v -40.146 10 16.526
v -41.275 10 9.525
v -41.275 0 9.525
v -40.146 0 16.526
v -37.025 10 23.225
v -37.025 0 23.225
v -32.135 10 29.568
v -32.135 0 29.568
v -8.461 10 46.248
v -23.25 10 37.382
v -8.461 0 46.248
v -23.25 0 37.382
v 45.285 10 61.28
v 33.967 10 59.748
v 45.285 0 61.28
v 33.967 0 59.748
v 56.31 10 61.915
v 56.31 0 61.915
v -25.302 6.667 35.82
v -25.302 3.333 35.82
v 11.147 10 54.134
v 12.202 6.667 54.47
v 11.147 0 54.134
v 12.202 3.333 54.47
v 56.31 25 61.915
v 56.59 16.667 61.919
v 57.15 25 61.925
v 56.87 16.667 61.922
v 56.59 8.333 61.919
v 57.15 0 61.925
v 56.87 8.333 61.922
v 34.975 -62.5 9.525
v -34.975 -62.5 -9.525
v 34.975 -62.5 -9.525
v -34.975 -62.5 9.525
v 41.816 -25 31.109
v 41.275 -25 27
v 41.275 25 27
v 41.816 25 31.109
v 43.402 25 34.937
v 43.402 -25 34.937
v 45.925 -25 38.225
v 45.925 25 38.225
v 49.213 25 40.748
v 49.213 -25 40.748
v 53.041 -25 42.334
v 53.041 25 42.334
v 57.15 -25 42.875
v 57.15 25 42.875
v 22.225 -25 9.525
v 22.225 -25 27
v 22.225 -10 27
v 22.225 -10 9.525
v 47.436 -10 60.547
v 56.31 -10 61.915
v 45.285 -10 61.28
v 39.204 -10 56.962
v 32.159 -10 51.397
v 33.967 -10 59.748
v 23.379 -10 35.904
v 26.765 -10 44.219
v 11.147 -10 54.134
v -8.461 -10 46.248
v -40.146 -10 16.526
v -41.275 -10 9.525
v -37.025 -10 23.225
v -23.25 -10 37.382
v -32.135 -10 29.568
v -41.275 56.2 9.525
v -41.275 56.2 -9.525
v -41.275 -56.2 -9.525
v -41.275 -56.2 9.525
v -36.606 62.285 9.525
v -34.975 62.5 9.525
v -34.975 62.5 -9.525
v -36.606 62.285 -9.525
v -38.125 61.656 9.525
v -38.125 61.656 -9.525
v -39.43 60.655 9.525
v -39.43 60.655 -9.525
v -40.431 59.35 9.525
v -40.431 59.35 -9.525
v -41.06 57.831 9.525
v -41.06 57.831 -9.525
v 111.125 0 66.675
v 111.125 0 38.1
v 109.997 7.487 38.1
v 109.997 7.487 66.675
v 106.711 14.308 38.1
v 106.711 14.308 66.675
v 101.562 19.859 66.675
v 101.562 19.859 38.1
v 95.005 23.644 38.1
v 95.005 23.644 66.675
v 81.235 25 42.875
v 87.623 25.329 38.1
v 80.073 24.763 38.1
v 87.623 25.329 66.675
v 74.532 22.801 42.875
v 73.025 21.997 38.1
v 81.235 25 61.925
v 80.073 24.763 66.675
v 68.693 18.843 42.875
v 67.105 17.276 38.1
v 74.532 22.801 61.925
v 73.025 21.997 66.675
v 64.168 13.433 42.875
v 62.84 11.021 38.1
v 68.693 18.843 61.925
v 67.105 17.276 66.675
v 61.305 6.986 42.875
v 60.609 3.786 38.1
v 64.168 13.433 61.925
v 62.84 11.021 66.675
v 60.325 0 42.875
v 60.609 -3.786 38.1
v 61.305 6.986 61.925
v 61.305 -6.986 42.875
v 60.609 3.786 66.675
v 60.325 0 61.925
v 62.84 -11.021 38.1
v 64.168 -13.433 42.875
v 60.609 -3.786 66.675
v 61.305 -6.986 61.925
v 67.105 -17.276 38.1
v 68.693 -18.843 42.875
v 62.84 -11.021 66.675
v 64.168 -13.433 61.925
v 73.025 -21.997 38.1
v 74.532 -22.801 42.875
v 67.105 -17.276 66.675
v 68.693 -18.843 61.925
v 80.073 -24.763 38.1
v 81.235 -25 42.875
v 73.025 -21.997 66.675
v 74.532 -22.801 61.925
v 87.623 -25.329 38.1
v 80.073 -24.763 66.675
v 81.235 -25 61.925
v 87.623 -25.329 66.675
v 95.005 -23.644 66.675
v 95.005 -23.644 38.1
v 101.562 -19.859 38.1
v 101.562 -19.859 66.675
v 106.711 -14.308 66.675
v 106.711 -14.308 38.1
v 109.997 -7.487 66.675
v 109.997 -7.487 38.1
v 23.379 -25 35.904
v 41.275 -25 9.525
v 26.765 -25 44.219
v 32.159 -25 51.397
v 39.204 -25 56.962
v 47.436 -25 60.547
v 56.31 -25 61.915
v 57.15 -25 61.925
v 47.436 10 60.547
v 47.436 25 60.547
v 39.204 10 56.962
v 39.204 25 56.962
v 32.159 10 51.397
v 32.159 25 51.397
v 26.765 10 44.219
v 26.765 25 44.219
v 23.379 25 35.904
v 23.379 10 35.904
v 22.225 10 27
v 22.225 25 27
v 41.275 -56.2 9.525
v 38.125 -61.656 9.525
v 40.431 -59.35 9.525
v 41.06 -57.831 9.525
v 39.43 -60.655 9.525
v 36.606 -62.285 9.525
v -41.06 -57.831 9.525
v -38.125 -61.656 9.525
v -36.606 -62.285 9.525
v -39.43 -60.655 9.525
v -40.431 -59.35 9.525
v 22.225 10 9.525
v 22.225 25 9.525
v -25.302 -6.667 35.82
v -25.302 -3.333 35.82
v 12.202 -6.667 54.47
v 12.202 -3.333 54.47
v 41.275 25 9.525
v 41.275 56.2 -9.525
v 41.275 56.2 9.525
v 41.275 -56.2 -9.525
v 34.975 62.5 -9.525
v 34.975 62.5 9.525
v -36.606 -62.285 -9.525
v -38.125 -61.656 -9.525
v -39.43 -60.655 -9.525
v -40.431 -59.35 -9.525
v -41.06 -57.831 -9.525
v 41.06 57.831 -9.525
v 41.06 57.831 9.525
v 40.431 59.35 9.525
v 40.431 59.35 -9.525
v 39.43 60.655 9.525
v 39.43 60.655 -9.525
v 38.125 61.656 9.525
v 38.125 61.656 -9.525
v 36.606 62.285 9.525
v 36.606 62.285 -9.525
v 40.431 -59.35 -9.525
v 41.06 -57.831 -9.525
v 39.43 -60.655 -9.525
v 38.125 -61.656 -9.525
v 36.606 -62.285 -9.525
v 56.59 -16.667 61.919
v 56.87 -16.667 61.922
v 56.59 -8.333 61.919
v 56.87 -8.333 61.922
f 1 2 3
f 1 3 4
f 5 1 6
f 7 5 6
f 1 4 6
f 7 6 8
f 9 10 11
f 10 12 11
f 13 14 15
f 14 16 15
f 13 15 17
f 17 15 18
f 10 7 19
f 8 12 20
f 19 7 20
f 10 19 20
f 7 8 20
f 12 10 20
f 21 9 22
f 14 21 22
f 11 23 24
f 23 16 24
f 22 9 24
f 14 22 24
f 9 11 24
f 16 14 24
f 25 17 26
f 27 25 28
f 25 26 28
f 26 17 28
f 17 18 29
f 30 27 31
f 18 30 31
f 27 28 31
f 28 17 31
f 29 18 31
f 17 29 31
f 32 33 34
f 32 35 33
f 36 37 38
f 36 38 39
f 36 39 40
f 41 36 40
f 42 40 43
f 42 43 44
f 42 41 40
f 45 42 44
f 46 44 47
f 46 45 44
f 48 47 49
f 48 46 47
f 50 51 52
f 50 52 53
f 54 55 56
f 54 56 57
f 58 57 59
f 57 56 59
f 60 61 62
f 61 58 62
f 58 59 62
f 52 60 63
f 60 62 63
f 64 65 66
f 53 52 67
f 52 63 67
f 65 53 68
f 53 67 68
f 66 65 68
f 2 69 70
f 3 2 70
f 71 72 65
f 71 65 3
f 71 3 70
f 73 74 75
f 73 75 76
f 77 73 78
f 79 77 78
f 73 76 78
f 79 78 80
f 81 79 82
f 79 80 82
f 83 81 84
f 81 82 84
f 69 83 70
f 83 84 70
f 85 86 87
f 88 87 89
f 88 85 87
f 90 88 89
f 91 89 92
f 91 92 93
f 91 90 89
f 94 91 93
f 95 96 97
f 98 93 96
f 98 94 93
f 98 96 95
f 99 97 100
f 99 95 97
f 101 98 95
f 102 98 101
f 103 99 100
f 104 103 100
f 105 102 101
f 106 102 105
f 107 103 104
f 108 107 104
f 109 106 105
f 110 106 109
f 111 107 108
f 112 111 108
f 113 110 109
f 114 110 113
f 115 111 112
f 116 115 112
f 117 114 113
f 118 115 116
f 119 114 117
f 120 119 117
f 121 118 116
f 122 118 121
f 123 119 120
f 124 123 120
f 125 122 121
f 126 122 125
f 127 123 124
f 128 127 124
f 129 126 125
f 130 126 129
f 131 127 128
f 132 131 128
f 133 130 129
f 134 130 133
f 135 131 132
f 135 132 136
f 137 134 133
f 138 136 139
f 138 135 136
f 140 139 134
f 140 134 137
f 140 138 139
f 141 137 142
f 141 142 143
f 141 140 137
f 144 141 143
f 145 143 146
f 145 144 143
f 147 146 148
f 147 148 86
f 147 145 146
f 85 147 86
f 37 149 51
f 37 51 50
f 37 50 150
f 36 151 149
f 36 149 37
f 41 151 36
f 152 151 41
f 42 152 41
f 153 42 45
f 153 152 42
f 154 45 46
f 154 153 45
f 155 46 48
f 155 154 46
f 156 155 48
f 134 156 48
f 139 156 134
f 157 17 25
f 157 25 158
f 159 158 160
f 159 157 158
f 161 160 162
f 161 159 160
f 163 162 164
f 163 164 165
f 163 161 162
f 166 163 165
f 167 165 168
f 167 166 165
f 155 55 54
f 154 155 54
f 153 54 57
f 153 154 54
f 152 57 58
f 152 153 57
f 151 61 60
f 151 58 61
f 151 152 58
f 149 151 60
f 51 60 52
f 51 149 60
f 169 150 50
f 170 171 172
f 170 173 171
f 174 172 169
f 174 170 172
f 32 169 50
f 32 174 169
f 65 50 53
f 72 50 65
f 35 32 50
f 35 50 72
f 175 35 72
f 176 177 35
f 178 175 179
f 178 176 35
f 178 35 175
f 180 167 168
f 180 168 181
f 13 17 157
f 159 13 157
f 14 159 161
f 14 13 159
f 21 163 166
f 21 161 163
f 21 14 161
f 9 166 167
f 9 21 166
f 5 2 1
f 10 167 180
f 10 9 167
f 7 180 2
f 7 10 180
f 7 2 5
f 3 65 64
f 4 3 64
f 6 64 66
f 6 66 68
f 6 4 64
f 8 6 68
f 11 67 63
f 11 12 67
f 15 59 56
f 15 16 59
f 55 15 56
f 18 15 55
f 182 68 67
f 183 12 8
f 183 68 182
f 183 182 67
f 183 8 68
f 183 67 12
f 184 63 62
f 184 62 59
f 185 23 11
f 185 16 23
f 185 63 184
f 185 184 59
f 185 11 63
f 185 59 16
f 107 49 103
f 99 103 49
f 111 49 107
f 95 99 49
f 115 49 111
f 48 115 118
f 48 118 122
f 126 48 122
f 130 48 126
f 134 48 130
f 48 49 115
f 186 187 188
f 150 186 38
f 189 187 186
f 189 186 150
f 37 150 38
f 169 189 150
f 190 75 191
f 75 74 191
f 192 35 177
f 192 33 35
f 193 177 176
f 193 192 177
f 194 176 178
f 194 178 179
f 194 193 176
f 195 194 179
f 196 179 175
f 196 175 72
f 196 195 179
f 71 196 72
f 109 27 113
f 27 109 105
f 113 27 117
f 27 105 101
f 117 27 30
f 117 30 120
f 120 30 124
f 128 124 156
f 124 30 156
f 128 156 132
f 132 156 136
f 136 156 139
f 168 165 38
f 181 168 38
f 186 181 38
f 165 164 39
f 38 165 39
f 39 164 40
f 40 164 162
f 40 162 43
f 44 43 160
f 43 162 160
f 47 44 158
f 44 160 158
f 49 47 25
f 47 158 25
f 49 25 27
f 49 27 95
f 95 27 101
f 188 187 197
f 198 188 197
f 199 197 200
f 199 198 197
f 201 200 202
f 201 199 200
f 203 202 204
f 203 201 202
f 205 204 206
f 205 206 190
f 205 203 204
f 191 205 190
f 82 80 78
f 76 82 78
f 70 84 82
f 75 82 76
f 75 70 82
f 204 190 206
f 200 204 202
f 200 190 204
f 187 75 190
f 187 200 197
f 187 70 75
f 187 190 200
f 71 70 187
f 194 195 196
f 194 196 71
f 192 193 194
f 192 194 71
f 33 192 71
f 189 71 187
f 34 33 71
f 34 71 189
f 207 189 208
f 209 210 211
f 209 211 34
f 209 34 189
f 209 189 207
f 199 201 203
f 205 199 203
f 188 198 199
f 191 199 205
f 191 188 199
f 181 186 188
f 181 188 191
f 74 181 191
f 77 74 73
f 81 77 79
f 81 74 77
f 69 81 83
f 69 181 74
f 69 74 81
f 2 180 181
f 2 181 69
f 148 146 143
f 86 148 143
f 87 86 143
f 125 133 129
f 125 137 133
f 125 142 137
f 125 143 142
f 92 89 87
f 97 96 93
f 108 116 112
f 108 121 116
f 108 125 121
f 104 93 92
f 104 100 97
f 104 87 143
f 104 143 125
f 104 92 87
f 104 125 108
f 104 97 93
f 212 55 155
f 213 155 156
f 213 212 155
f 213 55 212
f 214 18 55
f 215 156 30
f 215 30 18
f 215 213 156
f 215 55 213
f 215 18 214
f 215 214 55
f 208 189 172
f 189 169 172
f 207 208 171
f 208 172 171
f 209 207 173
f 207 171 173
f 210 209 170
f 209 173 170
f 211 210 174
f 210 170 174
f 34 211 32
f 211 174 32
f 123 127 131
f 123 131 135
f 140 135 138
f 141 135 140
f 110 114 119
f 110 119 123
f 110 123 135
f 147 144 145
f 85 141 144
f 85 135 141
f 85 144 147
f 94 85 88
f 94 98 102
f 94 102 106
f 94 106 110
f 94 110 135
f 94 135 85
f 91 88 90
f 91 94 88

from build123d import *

# Parameters (mm, degrees)
F1_DEPTH = 62.5
F2_DEPTH = 25
F3_DEPTH = 10
F0_W     = 25.4
F0_H     = 19.05
F4_DEPTH = 25
F6_R     = 6.3


with BuildPart() as f1:
    # F0 (on Front) → F1 (new body, symmetric)
    with BuildSketch(Plane.XZ):
        Polygon((22.225, 9.525), (-41.275, 9.525), (-41.275, -9.525), (41.275, -9.525), (41.275, 9.525), align=None)
    extrude(amount=F1_DEPTH, both=True)

    # F0 (on Front) → F2 (join, symmetric)
    with BuildSketch(Plane.XZ):
        with BuildLine():
            Line((22.225, 27), (22.225, 9.525))
            Line((22.225, 9.525), (41.275, 9.525))
            Line((41.275, 9.525), (41.275, 27))
            ThreePointArc((41.275, 27), (45.9246798487, 38.2253201513), (57.15, 42.875))
            Line((57.15, 42.875), (60.325, 42.875))
            Line((60.325, 42.875), (60.325, 61.925))
            Line((60.325, 61.925), (57.15, 61.925))
            add(Edge.make_bspline(
                [(56.3095148164, 61.9148852161), (56.5902291642, 61.9192274348), (56.8703973727, 61.9226005748), (57.15, 61.925)],
                knots=[110.7716747291, 110.7716747291, 110.7716747291, 110.7716747291, 111.5044421761, 111.5044421761, 111.5044421761, 111.5044421761], degree=3))
            ThreePointArc((56.3095148164, 61.9148852161), (32.1589058859, 51.3967383062), (22.225, 27))
        make_face()
    extrude(amount=F2_DEPTH, both=True)

    # F0 (on Front) → F3 (join, symmetric)
    with BuildSketch(Plane.XZ):
        with BuildLine():
            add(Edge.make_bspline(
                [(-41.275, 9.525), (-41.0414624957, 38.4566380676), (13.8742257665, 61.2584766517), (56.3095148164, 61.9148852161)],
                knots=[0, 0, 0, 0, 110.7716747291, 110.7716747291, 110.7716747291, 110.7716747291], degree=3))
            Line((-41.275, 9.525), (22.225, 9.525))
            Line((22.225, 9.525), (22.225, 27))
            ThreePointArc((22.225, 27), (32.1589058859, 51.3967383062), (56.3095148164, 61.9148852161))
        make_face()
    extrude(amount=F3_DEPTH, both=True)

    # F0 (on Front) → F4 (join, symmetric)
    with BuildSketch(Plane.XZ):
        with Locations((73.025, 52.4)):
            Rectangle(F0_W, F0_H)
    extrude(amount=F4_DEPTH, both=True)

    # F0 (on Front) → F5 (revolve)
    with BuildSketch(Plane.XZ):
        Polygon((85.725, 66.675), (85.725, 61.925), (85.725, 42.875), (85.725, 38.1), (111.125, 38.1), (111.125, 66.675), align=None)
    revolve(axis=Axis((85.725, 0, 52.3875), (0, 0, 1)))

    # F6
    f6_edges = [f1.edges().sort_by_distance(p)[0] for p in [
        (41.275, -62.5, 0),
        (-41.275, -62.5, 0),
        (41.275, 62.5, 0),
        (-41.275, 62.5, 0),
    ]]
    fillet(f6_edges, radius=F6_R)


solid = f1.part
